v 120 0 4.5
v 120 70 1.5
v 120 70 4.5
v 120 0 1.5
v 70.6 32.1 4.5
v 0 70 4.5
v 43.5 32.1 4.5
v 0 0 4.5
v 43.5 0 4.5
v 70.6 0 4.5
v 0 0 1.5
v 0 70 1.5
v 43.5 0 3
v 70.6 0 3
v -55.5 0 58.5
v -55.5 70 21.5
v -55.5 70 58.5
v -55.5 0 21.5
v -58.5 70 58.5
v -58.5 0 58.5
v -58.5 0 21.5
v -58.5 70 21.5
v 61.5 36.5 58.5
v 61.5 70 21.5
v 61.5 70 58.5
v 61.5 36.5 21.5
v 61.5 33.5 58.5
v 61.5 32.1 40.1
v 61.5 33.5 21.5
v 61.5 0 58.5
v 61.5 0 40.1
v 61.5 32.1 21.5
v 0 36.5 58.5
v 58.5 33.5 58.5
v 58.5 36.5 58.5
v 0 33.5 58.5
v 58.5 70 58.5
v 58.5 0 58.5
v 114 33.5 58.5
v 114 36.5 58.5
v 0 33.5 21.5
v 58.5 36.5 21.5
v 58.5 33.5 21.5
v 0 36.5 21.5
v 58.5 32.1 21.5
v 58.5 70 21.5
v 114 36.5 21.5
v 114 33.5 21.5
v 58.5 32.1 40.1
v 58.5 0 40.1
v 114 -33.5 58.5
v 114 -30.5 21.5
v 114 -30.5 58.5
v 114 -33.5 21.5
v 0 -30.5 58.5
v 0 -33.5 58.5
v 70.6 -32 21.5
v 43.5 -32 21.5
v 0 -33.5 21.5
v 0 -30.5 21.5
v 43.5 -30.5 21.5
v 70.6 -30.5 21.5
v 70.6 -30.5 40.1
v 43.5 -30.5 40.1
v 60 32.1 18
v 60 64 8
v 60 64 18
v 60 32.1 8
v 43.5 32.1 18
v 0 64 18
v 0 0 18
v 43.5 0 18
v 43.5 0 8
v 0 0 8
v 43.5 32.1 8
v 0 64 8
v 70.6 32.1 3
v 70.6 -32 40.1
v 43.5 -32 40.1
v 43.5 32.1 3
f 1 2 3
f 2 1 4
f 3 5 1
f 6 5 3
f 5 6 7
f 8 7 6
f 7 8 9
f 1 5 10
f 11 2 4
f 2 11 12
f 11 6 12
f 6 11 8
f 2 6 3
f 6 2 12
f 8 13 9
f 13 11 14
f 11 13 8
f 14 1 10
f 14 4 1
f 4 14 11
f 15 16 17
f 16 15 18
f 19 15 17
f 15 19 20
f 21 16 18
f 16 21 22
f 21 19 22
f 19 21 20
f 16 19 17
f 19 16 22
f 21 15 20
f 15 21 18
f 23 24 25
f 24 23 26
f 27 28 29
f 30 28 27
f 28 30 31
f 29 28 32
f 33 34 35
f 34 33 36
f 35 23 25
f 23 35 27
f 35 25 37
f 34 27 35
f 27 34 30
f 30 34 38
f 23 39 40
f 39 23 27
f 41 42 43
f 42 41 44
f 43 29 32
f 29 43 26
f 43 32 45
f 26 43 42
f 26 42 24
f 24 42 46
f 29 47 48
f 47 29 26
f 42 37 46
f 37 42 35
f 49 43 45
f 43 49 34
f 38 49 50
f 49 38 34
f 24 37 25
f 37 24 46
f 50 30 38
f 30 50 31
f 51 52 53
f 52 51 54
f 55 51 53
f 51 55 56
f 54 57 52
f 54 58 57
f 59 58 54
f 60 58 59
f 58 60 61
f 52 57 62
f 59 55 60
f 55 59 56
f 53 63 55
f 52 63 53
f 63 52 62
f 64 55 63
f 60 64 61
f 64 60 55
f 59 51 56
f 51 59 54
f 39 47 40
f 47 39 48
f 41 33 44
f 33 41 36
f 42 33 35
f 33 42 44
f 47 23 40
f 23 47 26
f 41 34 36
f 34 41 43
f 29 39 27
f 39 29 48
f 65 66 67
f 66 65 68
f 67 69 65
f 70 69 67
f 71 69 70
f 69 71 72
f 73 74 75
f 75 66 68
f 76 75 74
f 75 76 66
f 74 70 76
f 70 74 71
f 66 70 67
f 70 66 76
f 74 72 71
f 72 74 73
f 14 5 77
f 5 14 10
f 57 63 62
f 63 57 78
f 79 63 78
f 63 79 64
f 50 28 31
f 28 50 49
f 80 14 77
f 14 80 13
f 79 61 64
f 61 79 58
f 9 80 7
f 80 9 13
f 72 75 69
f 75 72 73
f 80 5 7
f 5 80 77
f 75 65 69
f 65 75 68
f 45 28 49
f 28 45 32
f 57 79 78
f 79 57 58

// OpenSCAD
// Buffer tank for mini horizontal gel-electrophoresis box
outer_x = 120;
outer_y = 70;
outer_z = 40;
wall_thick = 3;
floor_thick = 3;
platform_x = 60;
platform_y = outer_y - 2 * wall_thick; // 64
platform_z_bottom = floor_thick;       // 3
platform_z_top = 13;
platform_h = platform_z_top - platform_z_bottom; // 10
hole_diam = 2;
hole_y = 0;
hole_z = 30;
// Derived dimensions
inner_x = outer_x - 2 * wall_thick;  // 114
inner_y = platform_y;                // 64
inner_z = outer_z - floor_thick;     // 37
wall_h = inner_z;
chamber_x = (inner_x - platform_x) / 2; // 27

$fn = 64;

difference() {
    // Base solid: floor, walls, and platform
    union() {
        // Floor
        translate([0, 0, floor_thick / 2]) cube([outer_x, outer_y, floor_thick]);
        // Walls
        walls_z = floor_thick + wall_h / 2;
        // Left wall
        translate([-outer_x / 2 + wall_thick / 2, 0, walls_z]) cube([wall_thick, outer_y, wall_h]);
        // Right wall
        translate([outer_x / 2 - wall_thick / 2, 0, walls_z]) cube([wall_thick, outer_y, wall_h]);
        // Front wall
        translate([0, -outer_y / 2 + wall_thick / 2, walls_z]) cube([inner_x, wall_thick, wall_h]);
        // Back wall
        translate([0, outer_y / 2 - wall_thick / 2, walls_z]) cube([inner_x, wall_thick, wall_h]);
        // Platform
        translate([0, 0, platform_z_bottom + platform_h / 2]) cube([platform_x, platform_y, platform_h]);
    }
    
    // Cutters: two buffer chambers and the electrode hole
    union() {
        // Left chamber cavity (extends 0.05 mm past inner faces)
        translate([-outer_x / 2 + wall_thick + chamber_x / 2, -inner_y / 2, floor_thick])
            cube([chamber_x + 0.1, inner_y + 0.1, inner_z + 0.1]);
        // Right chamber cavity (extends 0.05 mm past inner faces)
        translate([outer_x / 2 - wall_thick - chamber_x / 2, -inner_y / 2, floor_thick])
            cube([chamber_x + 0.1, inner_y + 0.1, inner_z + 0.1]);
        // Electrode wire hole (extends 0.5 mm past each end wall)
        rotate([0, 90, 0]) cylinder(d=hole_diam, h=outer_x + 0.5, center=true);
    }
}
